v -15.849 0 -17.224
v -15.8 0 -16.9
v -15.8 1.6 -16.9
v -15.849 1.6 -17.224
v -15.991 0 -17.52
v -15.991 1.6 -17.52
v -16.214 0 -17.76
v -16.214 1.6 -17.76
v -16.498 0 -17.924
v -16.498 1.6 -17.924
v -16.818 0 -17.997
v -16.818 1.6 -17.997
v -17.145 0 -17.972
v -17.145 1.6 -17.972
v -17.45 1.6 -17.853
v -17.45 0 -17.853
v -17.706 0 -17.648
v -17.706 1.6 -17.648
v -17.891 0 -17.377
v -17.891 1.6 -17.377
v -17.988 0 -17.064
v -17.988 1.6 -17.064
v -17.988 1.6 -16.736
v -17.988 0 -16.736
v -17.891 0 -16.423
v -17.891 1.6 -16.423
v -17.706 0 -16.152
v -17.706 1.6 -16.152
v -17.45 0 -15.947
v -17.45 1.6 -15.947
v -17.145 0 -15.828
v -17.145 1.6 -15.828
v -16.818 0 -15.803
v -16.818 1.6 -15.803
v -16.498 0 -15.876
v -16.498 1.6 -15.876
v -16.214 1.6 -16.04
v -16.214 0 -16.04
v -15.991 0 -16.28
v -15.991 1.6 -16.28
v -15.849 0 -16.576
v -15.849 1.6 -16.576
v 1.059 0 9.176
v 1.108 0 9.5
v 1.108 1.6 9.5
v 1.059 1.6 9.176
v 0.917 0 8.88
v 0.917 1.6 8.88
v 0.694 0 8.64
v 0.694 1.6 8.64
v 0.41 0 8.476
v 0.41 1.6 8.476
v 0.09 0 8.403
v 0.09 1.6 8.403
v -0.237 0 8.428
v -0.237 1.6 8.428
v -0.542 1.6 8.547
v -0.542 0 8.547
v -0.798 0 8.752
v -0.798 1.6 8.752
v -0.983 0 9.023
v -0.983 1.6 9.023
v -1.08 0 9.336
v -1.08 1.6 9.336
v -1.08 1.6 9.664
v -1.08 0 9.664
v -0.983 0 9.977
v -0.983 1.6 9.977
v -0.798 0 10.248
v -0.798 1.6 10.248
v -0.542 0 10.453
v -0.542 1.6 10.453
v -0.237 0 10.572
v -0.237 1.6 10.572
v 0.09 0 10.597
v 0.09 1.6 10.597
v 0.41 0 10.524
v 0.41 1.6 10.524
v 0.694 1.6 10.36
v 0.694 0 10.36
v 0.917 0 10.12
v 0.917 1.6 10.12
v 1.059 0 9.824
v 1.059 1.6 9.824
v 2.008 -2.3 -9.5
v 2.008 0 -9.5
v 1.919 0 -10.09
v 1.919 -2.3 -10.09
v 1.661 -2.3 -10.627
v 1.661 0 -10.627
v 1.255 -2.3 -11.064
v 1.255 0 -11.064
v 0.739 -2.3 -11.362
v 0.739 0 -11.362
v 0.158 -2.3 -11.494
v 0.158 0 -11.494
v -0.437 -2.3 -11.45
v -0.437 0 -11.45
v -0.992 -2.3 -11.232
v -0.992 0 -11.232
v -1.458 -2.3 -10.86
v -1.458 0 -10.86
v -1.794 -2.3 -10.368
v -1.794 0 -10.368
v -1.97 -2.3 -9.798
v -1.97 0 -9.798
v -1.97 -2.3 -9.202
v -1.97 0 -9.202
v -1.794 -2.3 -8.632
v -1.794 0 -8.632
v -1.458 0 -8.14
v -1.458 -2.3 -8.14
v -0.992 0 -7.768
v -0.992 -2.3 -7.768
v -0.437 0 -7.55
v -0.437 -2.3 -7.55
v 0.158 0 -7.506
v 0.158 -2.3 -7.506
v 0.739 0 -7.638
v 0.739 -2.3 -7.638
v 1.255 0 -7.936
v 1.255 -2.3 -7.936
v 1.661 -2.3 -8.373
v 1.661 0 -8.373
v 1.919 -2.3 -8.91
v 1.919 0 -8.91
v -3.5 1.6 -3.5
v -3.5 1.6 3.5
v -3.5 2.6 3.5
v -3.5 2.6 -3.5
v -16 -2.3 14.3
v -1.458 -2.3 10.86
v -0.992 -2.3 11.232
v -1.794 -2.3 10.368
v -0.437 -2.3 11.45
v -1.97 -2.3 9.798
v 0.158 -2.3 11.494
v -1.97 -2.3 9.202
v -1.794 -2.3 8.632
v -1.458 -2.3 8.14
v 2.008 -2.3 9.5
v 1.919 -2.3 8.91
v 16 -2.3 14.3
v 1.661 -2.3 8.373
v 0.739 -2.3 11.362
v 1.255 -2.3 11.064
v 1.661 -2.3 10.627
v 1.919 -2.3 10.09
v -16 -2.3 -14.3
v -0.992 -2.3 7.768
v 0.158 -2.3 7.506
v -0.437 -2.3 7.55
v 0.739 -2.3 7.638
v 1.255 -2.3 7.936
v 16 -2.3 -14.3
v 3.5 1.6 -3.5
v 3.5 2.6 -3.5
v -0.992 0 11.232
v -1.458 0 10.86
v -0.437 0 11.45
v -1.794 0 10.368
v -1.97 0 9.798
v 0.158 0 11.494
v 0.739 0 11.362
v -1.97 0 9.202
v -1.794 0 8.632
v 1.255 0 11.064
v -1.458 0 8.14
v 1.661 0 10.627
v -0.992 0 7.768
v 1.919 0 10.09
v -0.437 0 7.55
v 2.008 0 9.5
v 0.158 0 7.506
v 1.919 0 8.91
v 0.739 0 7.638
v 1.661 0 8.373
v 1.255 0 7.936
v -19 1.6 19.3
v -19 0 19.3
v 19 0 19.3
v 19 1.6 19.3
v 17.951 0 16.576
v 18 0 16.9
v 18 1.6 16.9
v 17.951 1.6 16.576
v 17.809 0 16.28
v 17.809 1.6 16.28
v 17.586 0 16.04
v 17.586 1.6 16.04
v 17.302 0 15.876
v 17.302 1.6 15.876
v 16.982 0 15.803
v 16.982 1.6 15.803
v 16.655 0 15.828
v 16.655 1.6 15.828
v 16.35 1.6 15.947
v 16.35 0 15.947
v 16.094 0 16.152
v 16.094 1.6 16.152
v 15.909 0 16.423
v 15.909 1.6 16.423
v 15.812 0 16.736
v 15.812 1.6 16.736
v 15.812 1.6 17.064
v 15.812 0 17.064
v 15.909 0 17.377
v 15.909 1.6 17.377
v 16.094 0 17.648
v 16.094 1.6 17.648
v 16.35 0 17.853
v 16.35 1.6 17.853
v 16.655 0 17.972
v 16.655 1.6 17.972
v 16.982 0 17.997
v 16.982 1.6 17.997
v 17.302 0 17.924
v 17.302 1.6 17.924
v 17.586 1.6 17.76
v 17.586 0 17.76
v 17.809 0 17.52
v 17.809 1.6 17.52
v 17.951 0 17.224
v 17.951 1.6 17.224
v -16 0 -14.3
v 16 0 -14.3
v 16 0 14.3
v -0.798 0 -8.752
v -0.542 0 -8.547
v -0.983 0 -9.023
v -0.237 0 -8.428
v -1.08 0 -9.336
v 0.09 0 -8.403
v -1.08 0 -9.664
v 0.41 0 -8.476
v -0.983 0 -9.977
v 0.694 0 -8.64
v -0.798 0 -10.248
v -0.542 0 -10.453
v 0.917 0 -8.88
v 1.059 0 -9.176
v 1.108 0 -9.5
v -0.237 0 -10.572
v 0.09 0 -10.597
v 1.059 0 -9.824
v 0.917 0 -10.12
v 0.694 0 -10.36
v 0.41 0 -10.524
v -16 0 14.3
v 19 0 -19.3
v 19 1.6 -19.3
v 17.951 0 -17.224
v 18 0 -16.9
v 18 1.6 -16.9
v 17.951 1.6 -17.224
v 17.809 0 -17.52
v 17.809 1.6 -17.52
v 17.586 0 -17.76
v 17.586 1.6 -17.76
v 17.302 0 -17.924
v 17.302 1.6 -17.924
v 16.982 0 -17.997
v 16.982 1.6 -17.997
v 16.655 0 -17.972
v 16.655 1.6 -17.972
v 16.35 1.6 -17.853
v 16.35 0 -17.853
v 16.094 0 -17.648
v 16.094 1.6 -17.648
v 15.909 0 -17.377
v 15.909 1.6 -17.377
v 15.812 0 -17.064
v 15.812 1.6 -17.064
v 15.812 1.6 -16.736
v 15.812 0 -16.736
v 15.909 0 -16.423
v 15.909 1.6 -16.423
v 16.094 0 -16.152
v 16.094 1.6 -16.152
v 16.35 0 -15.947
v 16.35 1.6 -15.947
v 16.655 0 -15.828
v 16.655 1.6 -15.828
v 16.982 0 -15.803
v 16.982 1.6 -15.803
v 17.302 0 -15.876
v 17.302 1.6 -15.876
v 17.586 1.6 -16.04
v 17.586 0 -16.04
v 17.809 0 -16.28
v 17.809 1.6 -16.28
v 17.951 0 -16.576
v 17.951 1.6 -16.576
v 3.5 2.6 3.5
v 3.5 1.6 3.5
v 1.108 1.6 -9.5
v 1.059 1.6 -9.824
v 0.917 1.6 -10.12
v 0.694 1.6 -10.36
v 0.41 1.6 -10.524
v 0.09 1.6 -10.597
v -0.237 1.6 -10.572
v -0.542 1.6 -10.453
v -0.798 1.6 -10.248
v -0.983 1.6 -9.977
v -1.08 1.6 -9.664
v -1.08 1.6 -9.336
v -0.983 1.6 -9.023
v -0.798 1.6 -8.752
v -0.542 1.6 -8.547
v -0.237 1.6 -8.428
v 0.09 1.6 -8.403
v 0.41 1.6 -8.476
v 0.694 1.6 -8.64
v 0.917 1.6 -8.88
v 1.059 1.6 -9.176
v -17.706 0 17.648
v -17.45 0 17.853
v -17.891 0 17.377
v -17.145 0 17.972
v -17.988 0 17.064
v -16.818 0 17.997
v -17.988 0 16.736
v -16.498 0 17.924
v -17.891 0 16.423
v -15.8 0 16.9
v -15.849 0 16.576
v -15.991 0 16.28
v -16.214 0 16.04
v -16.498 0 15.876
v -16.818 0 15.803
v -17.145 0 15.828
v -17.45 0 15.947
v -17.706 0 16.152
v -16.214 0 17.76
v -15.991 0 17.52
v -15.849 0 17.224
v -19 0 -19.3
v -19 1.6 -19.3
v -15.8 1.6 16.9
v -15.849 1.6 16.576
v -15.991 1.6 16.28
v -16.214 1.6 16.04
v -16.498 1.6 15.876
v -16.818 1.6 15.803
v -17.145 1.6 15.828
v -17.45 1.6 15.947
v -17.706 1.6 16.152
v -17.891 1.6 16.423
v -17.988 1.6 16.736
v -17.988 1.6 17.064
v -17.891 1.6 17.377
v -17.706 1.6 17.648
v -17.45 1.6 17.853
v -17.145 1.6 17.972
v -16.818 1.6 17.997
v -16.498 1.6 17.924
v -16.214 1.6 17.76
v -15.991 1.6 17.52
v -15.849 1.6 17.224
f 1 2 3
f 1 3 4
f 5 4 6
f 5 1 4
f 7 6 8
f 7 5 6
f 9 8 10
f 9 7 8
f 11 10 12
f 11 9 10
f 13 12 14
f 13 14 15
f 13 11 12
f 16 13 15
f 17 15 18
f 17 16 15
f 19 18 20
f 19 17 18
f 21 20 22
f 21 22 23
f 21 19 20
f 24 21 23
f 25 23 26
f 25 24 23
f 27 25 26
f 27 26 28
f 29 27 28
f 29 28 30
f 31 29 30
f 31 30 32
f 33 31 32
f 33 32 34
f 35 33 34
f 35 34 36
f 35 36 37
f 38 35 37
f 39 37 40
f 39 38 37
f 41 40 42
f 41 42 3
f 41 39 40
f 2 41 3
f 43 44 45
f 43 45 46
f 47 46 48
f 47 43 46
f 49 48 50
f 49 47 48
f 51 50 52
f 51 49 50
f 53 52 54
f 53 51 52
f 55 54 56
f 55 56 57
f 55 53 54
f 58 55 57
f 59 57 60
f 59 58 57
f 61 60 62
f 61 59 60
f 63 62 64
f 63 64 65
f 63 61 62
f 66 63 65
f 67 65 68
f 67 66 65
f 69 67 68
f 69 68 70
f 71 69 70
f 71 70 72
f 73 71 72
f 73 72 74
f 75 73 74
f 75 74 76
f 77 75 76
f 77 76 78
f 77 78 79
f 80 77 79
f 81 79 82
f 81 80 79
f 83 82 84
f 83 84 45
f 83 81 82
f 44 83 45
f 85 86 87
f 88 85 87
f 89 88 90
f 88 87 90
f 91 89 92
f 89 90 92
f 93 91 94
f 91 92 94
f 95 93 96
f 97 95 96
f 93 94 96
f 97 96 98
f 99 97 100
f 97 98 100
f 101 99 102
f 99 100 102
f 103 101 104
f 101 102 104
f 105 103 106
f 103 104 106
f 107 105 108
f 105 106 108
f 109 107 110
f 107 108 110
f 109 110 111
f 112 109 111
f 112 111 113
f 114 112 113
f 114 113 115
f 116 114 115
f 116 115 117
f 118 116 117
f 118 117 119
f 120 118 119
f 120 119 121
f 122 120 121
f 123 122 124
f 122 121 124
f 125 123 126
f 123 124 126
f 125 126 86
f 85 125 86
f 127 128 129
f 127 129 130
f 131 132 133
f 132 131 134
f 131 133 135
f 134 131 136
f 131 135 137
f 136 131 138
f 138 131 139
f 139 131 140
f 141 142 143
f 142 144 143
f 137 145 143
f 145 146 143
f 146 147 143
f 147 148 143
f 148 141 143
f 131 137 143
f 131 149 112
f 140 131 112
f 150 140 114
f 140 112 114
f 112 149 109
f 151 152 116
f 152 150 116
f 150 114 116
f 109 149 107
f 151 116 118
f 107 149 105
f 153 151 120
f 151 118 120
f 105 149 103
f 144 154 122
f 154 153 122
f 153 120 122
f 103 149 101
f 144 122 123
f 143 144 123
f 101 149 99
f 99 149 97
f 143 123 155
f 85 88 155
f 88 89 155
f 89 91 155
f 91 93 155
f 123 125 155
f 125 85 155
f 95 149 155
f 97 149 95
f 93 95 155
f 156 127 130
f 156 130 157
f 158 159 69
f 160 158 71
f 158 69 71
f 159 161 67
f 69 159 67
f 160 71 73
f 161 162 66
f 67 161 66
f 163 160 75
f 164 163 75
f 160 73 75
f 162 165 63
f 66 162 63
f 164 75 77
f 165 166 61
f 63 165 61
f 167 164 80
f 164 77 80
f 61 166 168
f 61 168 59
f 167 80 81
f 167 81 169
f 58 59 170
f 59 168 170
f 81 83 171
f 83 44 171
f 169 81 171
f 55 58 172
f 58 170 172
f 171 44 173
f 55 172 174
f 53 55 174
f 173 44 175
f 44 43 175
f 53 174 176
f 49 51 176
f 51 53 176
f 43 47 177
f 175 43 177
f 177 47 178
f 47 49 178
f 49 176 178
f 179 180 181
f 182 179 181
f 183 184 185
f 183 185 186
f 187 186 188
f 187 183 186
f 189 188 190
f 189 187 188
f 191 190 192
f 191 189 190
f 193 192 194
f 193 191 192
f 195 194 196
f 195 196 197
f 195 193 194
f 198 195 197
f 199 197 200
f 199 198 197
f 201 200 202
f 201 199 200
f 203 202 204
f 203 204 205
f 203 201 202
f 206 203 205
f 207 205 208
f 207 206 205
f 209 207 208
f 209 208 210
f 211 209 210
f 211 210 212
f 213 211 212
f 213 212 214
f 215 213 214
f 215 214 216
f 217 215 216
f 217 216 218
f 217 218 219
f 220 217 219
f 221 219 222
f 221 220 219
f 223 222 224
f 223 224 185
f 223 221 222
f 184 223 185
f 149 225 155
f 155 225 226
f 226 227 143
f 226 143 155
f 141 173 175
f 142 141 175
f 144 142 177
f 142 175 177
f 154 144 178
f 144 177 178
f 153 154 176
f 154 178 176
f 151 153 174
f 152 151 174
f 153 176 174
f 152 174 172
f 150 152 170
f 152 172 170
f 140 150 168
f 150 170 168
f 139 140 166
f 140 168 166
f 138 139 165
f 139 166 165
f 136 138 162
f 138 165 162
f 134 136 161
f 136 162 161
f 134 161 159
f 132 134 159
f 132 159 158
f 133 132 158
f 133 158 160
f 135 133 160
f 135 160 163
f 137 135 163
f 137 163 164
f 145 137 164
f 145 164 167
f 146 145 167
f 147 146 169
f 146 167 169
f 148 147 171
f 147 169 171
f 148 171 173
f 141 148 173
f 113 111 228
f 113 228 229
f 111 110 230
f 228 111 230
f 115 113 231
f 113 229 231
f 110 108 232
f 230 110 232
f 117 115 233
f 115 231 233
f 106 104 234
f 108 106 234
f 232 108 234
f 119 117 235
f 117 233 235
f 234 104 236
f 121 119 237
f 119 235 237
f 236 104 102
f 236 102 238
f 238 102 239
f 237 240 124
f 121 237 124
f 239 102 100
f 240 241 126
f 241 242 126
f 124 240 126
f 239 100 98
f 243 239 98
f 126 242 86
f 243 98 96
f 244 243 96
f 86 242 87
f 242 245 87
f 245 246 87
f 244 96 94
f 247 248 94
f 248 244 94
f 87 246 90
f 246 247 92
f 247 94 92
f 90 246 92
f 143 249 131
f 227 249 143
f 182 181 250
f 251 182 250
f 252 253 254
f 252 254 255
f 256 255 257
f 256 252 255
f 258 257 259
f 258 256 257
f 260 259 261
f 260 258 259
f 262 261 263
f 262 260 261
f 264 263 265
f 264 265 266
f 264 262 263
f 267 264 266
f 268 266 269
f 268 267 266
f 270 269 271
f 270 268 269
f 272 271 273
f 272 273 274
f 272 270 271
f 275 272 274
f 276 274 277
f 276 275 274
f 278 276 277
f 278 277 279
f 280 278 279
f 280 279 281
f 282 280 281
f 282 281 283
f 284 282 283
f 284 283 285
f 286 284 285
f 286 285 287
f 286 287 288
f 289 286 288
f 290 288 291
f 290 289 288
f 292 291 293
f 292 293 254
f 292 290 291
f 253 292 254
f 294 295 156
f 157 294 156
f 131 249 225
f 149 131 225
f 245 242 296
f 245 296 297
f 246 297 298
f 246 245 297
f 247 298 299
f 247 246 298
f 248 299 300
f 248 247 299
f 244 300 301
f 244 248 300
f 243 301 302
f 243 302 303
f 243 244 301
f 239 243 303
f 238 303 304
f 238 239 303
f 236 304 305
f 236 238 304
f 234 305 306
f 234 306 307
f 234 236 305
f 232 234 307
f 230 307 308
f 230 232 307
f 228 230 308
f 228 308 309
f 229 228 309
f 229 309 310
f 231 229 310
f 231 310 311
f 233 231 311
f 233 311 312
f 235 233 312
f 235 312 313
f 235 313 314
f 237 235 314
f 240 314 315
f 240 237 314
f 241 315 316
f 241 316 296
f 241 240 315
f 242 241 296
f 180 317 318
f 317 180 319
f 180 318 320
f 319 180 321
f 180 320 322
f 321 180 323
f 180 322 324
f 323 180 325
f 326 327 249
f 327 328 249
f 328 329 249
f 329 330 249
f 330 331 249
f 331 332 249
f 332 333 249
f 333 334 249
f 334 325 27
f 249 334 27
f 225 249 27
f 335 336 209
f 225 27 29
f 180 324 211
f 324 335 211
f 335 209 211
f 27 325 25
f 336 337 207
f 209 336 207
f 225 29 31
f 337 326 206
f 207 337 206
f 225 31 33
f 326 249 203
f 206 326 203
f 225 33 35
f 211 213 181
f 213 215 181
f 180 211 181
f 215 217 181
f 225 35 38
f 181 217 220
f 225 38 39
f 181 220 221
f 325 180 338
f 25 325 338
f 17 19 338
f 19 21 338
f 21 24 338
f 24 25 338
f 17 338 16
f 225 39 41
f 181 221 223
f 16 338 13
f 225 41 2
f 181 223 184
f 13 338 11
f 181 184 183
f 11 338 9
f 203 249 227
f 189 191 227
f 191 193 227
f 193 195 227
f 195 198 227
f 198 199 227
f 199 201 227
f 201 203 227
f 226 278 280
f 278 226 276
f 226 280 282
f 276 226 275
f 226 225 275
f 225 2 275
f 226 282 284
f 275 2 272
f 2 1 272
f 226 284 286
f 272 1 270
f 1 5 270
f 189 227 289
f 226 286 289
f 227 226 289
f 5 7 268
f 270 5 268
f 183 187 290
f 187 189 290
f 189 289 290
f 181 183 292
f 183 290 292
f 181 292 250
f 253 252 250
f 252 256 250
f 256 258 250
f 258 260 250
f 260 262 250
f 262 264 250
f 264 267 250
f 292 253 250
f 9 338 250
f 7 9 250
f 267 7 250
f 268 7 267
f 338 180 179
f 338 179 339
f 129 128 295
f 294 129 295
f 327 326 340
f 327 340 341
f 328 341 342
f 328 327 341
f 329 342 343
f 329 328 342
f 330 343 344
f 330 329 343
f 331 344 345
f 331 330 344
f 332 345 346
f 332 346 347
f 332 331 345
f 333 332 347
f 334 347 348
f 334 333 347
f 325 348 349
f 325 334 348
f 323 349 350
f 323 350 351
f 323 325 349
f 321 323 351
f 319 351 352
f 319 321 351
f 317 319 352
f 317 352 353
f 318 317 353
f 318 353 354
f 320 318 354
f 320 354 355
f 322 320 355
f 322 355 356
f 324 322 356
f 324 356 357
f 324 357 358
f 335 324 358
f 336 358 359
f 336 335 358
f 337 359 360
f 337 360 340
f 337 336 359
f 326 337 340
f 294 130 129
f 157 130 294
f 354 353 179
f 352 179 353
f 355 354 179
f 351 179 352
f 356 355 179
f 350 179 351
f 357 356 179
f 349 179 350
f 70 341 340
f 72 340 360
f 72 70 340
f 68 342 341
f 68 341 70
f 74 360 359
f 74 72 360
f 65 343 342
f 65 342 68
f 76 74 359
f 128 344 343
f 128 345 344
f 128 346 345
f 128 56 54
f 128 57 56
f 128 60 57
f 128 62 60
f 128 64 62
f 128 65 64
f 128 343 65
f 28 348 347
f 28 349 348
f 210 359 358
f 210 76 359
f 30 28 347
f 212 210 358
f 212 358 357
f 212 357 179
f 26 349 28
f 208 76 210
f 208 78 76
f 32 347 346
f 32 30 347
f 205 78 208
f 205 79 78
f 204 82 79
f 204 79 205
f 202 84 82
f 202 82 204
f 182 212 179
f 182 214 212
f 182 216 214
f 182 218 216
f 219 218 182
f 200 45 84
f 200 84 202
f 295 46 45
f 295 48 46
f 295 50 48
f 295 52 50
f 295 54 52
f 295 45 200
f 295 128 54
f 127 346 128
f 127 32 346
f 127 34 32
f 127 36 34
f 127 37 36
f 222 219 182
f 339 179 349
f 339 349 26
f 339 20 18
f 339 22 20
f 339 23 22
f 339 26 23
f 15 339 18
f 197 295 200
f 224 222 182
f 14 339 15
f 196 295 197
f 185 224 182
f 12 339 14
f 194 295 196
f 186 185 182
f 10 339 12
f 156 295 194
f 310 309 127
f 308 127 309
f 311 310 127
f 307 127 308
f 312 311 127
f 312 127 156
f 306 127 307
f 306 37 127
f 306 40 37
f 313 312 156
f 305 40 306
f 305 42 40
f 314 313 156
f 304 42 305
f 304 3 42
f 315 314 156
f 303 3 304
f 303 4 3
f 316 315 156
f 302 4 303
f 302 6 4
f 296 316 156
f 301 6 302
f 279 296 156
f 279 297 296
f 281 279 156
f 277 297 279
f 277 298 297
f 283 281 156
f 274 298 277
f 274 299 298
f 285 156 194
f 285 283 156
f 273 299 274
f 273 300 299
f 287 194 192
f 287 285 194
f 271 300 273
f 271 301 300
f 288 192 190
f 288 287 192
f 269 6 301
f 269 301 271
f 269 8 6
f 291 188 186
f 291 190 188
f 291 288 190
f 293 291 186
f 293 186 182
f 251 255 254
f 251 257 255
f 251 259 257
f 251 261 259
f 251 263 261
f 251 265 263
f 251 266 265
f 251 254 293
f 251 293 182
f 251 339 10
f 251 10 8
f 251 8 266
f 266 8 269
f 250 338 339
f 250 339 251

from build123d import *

# Parameters (mm, degrees)
SKETCH1_W               = 38
SKETCH1_H               = 38.6
SKETCH1_R               = 1.1
CAMERA_BOARD_BASE_DEPTH = 1.6
SKETCH1_3_W             = 32
SKETCH1_3_H             = 28.6
SKETCH1_3_R             = 2
COMPONENTS_DEPTH        = 2.3
SKETCH2_W               = 7
SKETCH2_H               = 7
SENSOR_DEPTH            = 1


with BuildPart() as part:
    # Sketch1 → Camera Board Base (new body)
    with BuildSketch(Plane(origin=(0, 0, 0), x_dir=(1, 0, 0), z_dir=(0, 1, 0))):
        Rectangle(SKETCH1_W, SKETCH1_H)
        with Locations((0.008140781, 9.5)):
            Circle(SKETCH1_R, mode=Mode.SUBTRACT)
        with Locations((0.008140781, -9.5)):
            Circle(SKETCH1_R, mode=Mode.SUBTRACT)
        with Locations((-16.9, -16.9)):
            Circle(SKETCH1_R, mode=Mode.SUBTRACT)
        with Locations((16.9, -16.9)):
            Circle(SKETCH1_R, mode=Mode.SUBTRACT)
        with Locations((-16.9, 16.9)):
            Circle(SKETCH1_R, mode=Mode.SUBTRACT)
        with Locations((16.9, 16.9)):
            Circle(SKETCH1_R, mode=Mode.SUBTRACT)
    extrude(amount=CAMERA_BOARD_BASE_DEPTH)

    # Sketch1<3> → Components (add)
    with BuildSketch(Plane(origin=(0, 0, 0), x_dir=(1, 0, 0), z_dir=(0, 1, 0))):
        Rectangle(SKETCH1_3_W, SKETCH1_3_H)
        with Locations((0.008140781, 9.5)):
            Circle(SKETCH1_3_R, mode=Mode.SUBTRACT)
        with Locations((0.008140781, -9.5)):
            Circle(SKETCH1_3_R, mode=Mode.SUBTRACT)
    extrude(amount=-COMPONENTS_DEPTH)

    # Sketch2 → Sensor (add)
    with BuildSketch(Plane(origin=(0, 1.6, 0), x_dir=(1, 0, 0), z_dir=(0, 1, 0))):
        Rectangle(SKETCH2_W, SKETCH2_H)
    extrude(amount=SENSOR_DEPTH)


solid = part.part
